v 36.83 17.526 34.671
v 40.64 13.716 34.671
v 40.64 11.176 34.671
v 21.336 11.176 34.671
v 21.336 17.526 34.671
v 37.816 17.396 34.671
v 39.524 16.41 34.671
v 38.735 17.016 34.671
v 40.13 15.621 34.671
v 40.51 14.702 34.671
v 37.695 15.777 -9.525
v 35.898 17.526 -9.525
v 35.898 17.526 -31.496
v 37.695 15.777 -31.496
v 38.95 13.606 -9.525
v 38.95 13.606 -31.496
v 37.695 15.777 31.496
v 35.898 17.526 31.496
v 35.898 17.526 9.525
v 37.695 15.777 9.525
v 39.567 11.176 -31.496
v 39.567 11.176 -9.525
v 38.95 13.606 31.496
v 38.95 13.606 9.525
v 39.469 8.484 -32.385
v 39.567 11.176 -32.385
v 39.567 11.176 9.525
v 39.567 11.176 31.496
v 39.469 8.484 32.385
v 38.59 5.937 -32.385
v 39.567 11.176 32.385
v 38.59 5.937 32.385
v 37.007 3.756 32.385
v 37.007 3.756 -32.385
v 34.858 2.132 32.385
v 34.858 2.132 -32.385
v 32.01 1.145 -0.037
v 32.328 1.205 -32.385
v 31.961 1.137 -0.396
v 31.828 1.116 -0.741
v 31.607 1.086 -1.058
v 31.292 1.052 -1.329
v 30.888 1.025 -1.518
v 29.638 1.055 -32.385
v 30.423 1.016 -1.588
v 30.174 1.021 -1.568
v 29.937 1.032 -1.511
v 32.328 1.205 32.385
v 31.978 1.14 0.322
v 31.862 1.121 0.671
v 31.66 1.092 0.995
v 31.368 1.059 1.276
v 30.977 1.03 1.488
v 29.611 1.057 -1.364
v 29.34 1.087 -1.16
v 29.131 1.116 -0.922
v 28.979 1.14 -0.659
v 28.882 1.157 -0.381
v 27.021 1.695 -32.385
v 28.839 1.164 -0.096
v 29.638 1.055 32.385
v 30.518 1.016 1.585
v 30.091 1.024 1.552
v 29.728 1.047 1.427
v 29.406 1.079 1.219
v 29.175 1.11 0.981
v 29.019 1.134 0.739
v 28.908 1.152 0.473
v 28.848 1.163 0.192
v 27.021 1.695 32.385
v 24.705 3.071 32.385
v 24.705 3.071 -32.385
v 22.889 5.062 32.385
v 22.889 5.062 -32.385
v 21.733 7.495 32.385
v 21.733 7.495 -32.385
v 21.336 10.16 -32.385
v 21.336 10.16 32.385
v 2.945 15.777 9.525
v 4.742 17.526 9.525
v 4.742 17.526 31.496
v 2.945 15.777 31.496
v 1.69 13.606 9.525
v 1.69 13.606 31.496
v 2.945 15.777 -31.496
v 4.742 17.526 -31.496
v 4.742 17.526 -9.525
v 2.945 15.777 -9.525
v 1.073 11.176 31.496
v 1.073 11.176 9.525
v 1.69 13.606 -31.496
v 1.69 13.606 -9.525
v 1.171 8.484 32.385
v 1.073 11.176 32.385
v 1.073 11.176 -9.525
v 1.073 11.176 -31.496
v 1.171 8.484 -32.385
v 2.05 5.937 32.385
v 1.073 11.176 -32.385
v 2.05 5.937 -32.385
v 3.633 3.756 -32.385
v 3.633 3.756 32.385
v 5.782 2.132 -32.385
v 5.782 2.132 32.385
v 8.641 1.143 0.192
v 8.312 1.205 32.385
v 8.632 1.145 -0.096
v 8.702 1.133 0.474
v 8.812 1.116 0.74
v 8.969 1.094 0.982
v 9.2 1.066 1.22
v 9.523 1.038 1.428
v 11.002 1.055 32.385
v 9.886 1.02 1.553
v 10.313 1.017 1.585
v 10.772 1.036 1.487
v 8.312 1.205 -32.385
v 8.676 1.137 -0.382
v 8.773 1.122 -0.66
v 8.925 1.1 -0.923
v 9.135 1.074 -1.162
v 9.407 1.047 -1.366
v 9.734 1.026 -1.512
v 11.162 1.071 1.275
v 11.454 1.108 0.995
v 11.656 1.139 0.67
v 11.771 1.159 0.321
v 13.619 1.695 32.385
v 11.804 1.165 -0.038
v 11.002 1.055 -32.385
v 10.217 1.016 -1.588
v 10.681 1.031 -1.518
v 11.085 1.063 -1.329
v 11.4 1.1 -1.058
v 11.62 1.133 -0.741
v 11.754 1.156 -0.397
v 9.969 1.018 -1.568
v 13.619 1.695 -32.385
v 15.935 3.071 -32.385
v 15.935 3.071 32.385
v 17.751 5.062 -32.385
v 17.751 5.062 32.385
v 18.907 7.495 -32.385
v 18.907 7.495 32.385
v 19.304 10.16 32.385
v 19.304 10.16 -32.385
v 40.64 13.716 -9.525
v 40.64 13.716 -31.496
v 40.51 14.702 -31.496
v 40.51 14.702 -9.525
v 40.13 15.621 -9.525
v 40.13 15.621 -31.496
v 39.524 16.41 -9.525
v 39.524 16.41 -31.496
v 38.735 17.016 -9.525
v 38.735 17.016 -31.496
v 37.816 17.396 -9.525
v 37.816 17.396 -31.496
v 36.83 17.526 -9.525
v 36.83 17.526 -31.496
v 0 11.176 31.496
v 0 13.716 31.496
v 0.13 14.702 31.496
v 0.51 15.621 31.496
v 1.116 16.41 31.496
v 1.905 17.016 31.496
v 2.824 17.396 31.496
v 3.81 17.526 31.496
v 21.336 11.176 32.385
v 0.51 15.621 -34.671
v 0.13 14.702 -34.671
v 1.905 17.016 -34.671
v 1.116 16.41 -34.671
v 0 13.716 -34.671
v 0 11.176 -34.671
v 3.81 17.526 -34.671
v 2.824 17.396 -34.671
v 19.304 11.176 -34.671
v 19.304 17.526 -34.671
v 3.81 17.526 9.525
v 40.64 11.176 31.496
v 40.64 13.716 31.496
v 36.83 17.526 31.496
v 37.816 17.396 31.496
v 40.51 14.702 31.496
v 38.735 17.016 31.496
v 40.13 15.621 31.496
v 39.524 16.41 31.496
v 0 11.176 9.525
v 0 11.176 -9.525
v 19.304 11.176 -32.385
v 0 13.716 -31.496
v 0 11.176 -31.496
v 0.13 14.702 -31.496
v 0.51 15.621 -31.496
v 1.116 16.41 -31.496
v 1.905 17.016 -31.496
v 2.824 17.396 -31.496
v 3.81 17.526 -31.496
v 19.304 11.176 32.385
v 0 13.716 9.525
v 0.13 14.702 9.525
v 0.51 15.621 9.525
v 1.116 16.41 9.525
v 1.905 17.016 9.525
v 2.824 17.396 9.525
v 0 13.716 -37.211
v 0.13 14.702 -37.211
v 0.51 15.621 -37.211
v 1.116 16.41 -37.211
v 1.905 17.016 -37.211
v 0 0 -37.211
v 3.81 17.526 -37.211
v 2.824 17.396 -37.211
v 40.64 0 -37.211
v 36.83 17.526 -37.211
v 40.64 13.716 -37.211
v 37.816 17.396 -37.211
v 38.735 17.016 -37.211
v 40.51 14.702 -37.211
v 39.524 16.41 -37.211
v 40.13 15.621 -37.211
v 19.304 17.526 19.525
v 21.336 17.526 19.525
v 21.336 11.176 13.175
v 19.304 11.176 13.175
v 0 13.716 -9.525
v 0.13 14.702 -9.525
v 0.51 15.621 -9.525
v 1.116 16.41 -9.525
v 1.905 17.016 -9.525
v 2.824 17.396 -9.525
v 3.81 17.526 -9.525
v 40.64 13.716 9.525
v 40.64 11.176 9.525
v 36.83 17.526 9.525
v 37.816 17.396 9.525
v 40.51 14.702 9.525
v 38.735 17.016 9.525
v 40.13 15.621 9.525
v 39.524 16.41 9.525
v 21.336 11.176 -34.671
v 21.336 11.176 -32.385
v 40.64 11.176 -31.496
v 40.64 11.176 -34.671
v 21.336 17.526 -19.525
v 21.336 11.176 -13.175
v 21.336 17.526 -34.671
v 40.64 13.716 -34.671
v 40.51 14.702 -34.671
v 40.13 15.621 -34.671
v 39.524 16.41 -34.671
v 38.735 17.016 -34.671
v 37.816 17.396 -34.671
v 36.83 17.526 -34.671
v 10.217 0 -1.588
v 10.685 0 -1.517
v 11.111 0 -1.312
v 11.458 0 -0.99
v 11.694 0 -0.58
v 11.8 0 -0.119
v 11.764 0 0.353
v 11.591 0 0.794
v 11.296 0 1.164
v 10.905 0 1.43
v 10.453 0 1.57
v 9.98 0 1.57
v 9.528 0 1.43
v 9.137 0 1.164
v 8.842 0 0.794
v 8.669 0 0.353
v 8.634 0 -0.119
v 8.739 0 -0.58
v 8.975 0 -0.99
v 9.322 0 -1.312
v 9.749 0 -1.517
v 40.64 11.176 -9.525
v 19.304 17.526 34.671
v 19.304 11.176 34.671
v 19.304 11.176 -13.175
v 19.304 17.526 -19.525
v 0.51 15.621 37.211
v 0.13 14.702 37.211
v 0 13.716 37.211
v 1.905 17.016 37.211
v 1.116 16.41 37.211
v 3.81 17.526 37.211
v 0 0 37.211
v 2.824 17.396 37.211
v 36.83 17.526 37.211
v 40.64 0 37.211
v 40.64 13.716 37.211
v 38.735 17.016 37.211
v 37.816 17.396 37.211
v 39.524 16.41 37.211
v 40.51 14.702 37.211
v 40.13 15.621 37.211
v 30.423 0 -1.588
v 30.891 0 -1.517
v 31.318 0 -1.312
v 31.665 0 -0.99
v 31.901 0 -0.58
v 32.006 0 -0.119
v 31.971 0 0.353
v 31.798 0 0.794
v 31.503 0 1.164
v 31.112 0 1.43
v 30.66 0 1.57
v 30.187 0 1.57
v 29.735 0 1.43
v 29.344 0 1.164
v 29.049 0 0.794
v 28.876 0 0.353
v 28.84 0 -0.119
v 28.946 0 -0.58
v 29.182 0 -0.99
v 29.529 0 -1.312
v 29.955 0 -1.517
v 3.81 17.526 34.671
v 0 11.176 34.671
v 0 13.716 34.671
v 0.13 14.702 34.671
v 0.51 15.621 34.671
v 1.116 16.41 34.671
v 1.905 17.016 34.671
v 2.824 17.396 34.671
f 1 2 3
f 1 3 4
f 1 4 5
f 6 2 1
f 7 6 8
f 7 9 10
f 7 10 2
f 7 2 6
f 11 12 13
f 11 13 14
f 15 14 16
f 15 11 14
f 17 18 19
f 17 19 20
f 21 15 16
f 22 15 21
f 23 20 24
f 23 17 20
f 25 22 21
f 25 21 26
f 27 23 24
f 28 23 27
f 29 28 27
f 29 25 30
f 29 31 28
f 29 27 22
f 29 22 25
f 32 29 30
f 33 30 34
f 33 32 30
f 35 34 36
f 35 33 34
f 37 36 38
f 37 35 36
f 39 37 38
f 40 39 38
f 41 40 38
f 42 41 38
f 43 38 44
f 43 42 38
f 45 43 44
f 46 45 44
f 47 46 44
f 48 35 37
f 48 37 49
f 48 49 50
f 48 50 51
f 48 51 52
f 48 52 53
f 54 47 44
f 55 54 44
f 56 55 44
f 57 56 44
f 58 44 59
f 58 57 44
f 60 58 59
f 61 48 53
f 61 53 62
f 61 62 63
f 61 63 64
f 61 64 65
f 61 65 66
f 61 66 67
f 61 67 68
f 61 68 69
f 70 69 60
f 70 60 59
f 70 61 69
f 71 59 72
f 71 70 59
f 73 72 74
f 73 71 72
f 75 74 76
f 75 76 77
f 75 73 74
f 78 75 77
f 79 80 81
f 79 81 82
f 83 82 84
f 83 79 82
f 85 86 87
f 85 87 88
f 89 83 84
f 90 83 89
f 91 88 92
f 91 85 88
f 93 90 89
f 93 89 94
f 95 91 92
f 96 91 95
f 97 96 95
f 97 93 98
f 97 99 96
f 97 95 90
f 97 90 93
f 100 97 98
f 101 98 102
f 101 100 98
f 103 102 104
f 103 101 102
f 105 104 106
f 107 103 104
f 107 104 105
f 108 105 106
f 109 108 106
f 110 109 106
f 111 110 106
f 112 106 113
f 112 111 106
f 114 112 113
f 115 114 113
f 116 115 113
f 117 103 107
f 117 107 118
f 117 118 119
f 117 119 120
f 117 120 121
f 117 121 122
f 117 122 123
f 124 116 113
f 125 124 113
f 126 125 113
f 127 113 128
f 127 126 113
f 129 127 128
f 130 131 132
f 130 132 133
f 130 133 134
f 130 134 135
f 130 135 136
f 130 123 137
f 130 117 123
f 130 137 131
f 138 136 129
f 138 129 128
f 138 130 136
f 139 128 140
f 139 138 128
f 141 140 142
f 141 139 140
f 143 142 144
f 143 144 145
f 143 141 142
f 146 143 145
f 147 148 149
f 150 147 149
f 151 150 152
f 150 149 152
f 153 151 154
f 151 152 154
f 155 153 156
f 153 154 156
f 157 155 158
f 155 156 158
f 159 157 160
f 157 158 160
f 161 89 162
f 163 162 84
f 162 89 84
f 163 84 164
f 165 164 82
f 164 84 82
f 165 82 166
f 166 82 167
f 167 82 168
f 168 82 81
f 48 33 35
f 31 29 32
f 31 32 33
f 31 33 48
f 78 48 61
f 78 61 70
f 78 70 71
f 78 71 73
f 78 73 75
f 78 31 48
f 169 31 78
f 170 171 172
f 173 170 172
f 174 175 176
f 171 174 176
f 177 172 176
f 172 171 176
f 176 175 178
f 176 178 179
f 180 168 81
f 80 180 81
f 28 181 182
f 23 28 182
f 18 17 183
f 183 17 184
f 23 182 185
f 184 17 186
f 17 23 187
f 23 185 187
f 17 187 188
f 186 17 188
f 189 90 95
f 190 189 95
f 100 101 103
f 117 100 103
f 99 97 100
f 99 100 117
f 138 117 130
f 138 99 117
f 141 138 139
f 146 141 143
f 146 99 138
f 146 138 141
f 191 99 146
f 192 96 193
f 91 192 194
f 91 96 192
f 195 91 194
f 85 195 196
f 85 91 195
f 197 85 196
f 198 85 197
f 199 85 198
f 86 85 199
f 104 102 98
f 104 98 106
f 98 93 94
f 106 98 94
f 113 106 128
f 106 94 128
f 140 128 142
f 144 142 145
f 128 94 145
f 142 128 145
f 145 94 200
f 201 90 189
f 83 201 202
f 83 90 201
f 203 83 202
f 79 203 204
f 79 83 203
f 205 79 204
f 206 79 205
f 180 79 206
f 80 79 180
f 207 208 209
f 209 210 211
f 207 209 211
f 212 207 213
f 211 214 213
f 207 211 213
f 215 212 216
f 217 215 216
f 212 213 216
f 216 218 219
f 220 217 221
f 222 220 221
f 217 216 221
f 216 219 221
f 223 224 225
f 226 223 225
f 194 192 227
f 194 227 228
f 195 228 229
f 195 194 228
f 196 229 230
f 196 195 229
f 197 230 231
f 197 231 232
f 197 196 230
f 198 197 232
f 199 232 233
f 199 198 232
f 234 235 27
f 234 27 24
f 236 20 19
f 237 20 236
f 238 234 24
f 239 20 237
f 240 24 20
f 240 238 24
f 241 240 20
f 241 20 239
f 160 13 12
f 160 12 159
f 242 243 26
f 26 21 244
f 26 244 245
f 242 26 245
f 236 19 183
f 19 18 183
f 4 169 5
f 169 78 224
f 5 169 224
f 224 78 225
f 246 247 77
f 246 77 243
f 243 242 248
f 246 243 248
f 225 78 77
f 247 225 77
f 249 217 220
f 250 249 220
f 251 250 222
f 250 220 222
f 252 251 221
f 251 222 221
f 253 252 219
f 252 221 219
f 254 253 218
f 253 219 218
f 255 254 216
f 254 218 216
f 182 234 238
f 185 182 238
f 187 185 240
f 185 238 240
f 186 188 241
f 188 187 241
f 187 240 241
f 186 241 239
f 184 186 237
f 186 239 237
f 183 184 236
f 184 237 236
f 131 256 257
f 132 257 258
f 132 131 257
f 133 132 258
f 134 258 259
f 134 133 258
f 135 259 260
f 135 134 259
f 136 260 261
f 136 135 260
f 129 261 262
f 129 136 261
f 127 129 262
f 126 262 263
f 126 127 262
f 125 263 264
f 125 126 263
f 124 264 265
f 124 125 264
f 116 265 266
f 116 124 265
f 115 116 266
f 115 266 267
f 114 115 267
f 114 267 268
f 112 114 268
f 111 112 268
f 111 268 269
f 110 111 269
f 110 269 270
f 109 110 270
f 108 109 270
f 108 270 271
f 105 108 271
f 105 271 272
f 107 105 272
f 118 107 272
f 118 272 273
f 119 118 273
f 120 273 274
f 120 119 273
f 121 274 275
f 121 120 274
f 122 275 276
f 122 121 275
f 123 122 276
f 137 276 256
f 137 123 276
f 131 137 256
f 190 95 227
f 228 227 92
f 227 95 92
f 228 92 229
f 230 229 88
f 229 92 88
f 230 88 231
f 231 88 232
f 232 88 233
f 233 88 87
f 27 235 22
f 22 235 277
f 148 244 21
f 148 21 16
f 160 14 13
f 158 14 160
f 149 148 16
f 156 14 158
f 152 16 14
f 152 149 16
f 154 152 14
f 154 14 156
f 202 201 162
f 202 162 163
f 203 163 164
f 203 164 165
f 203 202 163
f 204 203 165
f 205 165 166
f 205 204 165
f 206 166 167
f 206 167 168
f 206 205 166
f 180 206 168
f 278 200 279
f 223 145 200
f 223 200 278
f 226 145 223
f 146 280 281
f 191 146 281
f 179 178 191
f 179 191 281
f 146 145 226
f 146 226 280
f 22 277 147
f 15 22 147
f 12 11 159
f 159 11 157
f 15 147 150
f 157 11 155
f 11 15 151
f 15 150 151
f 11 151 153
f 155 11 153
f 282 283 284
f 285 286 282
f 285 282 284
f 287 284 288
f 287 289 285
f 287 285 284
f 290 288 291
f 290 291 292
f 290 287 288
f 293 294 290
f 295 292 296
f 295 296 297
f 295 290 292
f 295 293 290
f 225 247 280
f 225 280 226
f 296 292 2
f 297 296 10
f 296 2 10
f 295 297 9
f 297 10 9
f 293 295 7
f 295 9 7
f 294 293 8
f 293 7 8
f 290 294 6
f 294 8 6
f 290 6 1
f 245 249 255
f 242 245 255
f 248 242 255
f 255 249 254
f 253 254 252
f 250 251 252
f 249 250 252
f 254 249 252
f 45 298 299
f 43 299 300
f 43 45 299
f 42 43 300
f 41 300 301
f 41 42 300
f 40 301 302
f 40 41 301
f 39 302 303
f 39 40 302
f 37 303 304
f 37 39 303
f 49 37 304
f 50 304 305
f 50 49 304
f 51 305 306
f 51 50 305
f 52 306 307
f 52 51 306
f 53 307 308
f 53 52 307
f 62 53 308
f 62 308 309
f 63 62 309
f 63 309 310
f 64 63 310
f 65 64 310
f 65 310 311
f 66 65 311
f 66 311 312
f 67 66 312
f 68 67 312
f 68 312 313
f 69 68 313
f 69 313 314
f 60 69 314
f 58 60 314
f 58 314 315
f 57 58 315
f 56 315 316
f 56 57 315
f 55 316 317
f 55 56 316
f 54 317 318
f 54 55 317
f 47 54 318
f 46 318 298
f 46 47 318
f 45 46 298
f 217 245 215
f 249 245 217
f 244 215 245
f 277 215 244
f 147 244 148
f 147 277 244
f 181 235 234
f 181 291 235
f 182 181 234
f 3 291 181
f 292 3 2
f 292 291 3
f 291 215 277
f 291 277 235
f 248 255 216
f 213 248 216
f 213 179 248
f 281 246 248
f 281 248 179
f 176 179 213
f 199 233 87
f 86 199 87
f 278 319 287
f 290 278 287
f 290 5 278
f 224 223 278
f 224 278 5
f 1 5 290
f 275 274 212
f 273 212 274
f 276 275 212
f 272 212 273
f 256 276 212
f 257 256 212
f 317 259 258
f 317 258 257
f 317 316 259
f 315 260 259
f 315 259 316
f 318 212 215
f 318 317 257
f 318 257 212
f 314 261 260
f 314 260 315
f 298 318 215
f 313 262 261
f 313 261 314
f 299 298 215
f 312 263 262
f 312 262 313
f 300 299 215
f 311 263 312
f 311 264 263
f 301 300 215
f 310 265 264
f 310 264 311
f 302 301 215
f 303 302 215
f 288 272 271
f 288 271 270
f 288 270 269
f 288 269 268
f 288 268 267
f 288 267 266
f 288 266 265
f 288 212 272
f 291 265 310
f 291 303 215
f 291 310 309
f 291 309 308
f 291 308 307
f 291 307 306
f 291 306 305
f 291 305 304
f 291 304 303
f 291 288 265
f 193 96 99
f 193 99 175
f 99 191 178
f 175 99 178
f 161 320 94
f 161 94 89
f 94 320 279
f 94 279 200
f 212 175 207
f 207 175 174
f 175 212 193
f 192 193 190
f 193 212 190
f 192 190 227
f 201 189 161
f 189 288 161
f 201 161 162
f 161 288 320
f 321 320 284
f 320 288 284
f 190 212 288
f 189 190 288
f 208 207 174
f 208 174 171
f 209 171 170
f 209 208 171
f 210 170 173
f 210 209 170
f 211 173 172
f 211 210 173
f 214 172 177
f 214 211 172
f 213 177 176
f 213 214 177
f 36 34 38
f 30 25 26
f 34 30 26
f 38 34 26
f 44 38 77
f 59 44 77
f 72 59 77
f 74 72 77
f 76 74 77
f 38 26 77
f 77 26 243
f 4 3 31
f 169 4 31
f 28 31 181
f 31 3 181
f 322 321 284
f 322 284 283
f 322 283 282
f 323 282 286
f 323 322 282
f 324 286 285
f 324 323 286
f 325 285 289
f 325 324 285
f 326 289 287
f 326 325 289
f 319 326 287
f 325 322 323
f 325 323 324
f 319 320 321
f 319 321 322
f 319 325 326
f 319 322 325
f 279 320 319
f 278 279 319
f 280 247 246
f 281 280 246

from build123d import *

# Parameters (mm, degrees)
SKETCH1_W               = 40.64
SKETCH1_H               = 17.526
BOSS_EXTRUDE1_DEPTH     = 37.211
CUT_EXTRUDE1_DEPTH      = 32.385
FILLET1_R               = 3.81
SKETCH3_W               = 3.175
SKETCH3_H               = 6.35
SKETCH3_W_2             = 19.05
CUT_EXTRUDE2_DEPTH      = 58.822390101
CHAMFER1_SIZE           = 10
CUT_EXTRUDE7_DEPTH      = 58.822390101
CUT_EXTRUDE7_DEPTH_BACK = 58.822390101
SKETCH5_R               = 1.5875
BOSS_EXTRUDE2_REACH     = 83.728
SKETCH6_W               = 2.032
SKETCH6_H               = 6.35
BOSS_EXTRUDE3_REACH     = 83.728
SKETCH7_W               = 2.032
SKETCH7_H               = 6.35


with BuildPart() as part:
    # Sketch1 → Boss-Extrude1 (new, symmetric)
    with BuildSketch(Plane.XY):
        with Locations((20.32, 8.763)):
            Rectangle(SKETCH1_W, SKETCH1_H)
    extrude(amount=BOSS_EXTRUDE1_DEPTH, both=True)

    # Sketch2 → Cut-Extrude1 (cut, symmetric)
    with BuildSketch(Plane.XY):
        with BuildLine():
            Line((19.304, 10.16), (19.304, 17.526))
            Line((19.304, 17.526), (15.578005168, 17.526))
            ThreePointArc((15.578005168, 17.526), (2.000497097, 6.032622095), (19.304, 10.16))
        make_face()
        with BuildLine():
            Line((21.336, 10.16), (21.336, 17.526))
            Line((21.336, 17.526), (25.061994832, 17.526))
            ThreePointArc((25.061994832, 17.526), (38.639502903, 6.032622095), (21.336, 10.16))
        make_face()
    extrude(amount=CUT_EXTRUDE1_DEPTH, both=True, mode=Mode.SUBTRACT)

    # Fillet1
    fillet1_edges = [part.edges().sort_by_distance(p)[0] for p in [
        (0, 17.526, 0),
        (40.64, 17.526, 0),
    ]]
    fillet(fillet1_edges, radius=FILLET1_R)

    # Sketch3 → Cut-Extrude2 (cut, through all)
    with BuildSketch(Plane(origin=(40.64, 0, 0), x_dir=(0, 0, -1), z_dir=(1, 0, 0))):
        with Locations((-33.0835, 14.351)):
            Rectangle(SKETCH3_W, SKETCH3_H)
        with Locations((0, 14.351)):
            Rectangle(SKETCH3_W_2, SKETCH3_H)
        with Locations((33.0835, 14.351)):
            Rectangle(SKETCH3_W, SKETCH3_H)
    extrude(amount=-CUT_EXTRUDE2_DEPTH, mode=Mode.SUBTRACT)

    # Chamfer1
    # the kernel refuses this chamfer: 10 mm, written as the material it takes off along each edge
    with BuildSketch(Plane(origin=(21.336, 17.526, -9.525), x_dir=(0, -0.9996219169112968, 0.027495876610586664), z_dir=(-1, 0, 0))) as chamfer1_piece_1_section:
        Polygon((CHAMFER1_SIZE * 0.999621916911, -CHAMFER1_SIZE * 0.0274958766106), (-CHAMFER1_SIZE * 0.0274958766106, -CHAMFER1_SIZE * 0.999621916911), (0, 0), align=None)
    chamfer1_piece_1 = extrude(amount=2.032, mode=Mode.PRIVATE)
    chamfer1_piece_1 = split(chamfer1_piece_1, bisect_by=Plane(origin=(20.32, 11.176, -13.183669109), z_dir=(0, 1, 0)), keep=Keep.TOP, mode=Mode.PRIVATE)
    add(chamfer1_piece_1, mode=Mode.SUBTRACT)
    with BuildSketch(Plane(origin=(21.336, 17.526, 9.525), x_dir=(0, 0.027495876610586324, 0.9996219169112968), z_dir=(-1, 0, 0))) as chamfer1_piece_2_section:
        Polygon((CHAMFER1_SIZE * 0.999621916911, -CHAMFER1_SIZE * 0.0274958766106), (-CHAMFER1_SIZE * 0.0274958766106, -CHAMFER1_SIZE * 0.999621916911), (0, 0), align=None)
    chamfer1_piece_2 = extrude(amount=2.032, mode=Mode.PRIVATE)
    chamfer1_piece_2 = split(chamfer1_piece_2, bisect_by=Plane(origin=(20.32, 11.176, 13.183669109), z_dir=(0, 1, 0)), keep=Keep.TOP, mode=Mode.PRIVATE)
    add(chamfer1_piece_2, mode=Mode.SUBTRACT)

    # Sketch5 → Cut-Extrude7 (cut, two sides: drawn at the far end of the back side and taken through both)
    with BuildSketch(Plane.XZ.offset(-CUT_EXTRUDE7_DEPTH_BACK)):
        with Locations(Location((30.423380261, 0, 0), (0, 0, 270))):
            Circle(SKETCH5_R)
        with Locations(Location((10.216619739, 0, 0), (0, 0, 270))):
            Circle(SKETCH5_R)
    extrude(amount=CUT_EXTRUDE7_DEPTH + CUT_EXTRUDE7_DEPTH_BACK, mode=Mode.SUBTRACT)

    # Sketch6 → Boss-Extrude2 (add, up to next)
    with BuildSketch(Plane(origin=(0, 0, -31.496), x_dir=(-1, 0, 0), z_dir=(0, 0, -1)), mode=Mode.PRIVATE) as boss_extrude2_sk1:
        with Locations((-20.32, 14.351)):
            Rectangle(SKETCH6_W, SKETCH6_H)
    boss_extrude2_tool1 = extrude(boss_extrude2_sk1.sketch, amount=BOSS_EXTRUDE2_REACH, mode=Mode.PRIVATE) - part.part
    add(boss_extrude2_tool1.solids().sort_by_distance((20.32, 14.351, -31.496))[0])

    # Sketch7 → Boss-Extrude3 (add, up to next)
    with BuildSketch(Plane.XY.offset(31.496), mode=Mode.PRIVATE) as boss_extrude3_sk1:
        with Locations((20.32, 14.351)):
            Rectangle(SKETCH7_W, SKETCH7_H)
    boss_extrude3_tool1 = extrude(boss_extrude3_sk1.sketch, amount=BOSS_EXTRUDE3_REACH, mode=Mode.PRIVATE) - part.part
    add(boss_extrude3_tool1.solids().sort_by_distance((20.32, 14.351, 31.496))[0])


solid = part.part
